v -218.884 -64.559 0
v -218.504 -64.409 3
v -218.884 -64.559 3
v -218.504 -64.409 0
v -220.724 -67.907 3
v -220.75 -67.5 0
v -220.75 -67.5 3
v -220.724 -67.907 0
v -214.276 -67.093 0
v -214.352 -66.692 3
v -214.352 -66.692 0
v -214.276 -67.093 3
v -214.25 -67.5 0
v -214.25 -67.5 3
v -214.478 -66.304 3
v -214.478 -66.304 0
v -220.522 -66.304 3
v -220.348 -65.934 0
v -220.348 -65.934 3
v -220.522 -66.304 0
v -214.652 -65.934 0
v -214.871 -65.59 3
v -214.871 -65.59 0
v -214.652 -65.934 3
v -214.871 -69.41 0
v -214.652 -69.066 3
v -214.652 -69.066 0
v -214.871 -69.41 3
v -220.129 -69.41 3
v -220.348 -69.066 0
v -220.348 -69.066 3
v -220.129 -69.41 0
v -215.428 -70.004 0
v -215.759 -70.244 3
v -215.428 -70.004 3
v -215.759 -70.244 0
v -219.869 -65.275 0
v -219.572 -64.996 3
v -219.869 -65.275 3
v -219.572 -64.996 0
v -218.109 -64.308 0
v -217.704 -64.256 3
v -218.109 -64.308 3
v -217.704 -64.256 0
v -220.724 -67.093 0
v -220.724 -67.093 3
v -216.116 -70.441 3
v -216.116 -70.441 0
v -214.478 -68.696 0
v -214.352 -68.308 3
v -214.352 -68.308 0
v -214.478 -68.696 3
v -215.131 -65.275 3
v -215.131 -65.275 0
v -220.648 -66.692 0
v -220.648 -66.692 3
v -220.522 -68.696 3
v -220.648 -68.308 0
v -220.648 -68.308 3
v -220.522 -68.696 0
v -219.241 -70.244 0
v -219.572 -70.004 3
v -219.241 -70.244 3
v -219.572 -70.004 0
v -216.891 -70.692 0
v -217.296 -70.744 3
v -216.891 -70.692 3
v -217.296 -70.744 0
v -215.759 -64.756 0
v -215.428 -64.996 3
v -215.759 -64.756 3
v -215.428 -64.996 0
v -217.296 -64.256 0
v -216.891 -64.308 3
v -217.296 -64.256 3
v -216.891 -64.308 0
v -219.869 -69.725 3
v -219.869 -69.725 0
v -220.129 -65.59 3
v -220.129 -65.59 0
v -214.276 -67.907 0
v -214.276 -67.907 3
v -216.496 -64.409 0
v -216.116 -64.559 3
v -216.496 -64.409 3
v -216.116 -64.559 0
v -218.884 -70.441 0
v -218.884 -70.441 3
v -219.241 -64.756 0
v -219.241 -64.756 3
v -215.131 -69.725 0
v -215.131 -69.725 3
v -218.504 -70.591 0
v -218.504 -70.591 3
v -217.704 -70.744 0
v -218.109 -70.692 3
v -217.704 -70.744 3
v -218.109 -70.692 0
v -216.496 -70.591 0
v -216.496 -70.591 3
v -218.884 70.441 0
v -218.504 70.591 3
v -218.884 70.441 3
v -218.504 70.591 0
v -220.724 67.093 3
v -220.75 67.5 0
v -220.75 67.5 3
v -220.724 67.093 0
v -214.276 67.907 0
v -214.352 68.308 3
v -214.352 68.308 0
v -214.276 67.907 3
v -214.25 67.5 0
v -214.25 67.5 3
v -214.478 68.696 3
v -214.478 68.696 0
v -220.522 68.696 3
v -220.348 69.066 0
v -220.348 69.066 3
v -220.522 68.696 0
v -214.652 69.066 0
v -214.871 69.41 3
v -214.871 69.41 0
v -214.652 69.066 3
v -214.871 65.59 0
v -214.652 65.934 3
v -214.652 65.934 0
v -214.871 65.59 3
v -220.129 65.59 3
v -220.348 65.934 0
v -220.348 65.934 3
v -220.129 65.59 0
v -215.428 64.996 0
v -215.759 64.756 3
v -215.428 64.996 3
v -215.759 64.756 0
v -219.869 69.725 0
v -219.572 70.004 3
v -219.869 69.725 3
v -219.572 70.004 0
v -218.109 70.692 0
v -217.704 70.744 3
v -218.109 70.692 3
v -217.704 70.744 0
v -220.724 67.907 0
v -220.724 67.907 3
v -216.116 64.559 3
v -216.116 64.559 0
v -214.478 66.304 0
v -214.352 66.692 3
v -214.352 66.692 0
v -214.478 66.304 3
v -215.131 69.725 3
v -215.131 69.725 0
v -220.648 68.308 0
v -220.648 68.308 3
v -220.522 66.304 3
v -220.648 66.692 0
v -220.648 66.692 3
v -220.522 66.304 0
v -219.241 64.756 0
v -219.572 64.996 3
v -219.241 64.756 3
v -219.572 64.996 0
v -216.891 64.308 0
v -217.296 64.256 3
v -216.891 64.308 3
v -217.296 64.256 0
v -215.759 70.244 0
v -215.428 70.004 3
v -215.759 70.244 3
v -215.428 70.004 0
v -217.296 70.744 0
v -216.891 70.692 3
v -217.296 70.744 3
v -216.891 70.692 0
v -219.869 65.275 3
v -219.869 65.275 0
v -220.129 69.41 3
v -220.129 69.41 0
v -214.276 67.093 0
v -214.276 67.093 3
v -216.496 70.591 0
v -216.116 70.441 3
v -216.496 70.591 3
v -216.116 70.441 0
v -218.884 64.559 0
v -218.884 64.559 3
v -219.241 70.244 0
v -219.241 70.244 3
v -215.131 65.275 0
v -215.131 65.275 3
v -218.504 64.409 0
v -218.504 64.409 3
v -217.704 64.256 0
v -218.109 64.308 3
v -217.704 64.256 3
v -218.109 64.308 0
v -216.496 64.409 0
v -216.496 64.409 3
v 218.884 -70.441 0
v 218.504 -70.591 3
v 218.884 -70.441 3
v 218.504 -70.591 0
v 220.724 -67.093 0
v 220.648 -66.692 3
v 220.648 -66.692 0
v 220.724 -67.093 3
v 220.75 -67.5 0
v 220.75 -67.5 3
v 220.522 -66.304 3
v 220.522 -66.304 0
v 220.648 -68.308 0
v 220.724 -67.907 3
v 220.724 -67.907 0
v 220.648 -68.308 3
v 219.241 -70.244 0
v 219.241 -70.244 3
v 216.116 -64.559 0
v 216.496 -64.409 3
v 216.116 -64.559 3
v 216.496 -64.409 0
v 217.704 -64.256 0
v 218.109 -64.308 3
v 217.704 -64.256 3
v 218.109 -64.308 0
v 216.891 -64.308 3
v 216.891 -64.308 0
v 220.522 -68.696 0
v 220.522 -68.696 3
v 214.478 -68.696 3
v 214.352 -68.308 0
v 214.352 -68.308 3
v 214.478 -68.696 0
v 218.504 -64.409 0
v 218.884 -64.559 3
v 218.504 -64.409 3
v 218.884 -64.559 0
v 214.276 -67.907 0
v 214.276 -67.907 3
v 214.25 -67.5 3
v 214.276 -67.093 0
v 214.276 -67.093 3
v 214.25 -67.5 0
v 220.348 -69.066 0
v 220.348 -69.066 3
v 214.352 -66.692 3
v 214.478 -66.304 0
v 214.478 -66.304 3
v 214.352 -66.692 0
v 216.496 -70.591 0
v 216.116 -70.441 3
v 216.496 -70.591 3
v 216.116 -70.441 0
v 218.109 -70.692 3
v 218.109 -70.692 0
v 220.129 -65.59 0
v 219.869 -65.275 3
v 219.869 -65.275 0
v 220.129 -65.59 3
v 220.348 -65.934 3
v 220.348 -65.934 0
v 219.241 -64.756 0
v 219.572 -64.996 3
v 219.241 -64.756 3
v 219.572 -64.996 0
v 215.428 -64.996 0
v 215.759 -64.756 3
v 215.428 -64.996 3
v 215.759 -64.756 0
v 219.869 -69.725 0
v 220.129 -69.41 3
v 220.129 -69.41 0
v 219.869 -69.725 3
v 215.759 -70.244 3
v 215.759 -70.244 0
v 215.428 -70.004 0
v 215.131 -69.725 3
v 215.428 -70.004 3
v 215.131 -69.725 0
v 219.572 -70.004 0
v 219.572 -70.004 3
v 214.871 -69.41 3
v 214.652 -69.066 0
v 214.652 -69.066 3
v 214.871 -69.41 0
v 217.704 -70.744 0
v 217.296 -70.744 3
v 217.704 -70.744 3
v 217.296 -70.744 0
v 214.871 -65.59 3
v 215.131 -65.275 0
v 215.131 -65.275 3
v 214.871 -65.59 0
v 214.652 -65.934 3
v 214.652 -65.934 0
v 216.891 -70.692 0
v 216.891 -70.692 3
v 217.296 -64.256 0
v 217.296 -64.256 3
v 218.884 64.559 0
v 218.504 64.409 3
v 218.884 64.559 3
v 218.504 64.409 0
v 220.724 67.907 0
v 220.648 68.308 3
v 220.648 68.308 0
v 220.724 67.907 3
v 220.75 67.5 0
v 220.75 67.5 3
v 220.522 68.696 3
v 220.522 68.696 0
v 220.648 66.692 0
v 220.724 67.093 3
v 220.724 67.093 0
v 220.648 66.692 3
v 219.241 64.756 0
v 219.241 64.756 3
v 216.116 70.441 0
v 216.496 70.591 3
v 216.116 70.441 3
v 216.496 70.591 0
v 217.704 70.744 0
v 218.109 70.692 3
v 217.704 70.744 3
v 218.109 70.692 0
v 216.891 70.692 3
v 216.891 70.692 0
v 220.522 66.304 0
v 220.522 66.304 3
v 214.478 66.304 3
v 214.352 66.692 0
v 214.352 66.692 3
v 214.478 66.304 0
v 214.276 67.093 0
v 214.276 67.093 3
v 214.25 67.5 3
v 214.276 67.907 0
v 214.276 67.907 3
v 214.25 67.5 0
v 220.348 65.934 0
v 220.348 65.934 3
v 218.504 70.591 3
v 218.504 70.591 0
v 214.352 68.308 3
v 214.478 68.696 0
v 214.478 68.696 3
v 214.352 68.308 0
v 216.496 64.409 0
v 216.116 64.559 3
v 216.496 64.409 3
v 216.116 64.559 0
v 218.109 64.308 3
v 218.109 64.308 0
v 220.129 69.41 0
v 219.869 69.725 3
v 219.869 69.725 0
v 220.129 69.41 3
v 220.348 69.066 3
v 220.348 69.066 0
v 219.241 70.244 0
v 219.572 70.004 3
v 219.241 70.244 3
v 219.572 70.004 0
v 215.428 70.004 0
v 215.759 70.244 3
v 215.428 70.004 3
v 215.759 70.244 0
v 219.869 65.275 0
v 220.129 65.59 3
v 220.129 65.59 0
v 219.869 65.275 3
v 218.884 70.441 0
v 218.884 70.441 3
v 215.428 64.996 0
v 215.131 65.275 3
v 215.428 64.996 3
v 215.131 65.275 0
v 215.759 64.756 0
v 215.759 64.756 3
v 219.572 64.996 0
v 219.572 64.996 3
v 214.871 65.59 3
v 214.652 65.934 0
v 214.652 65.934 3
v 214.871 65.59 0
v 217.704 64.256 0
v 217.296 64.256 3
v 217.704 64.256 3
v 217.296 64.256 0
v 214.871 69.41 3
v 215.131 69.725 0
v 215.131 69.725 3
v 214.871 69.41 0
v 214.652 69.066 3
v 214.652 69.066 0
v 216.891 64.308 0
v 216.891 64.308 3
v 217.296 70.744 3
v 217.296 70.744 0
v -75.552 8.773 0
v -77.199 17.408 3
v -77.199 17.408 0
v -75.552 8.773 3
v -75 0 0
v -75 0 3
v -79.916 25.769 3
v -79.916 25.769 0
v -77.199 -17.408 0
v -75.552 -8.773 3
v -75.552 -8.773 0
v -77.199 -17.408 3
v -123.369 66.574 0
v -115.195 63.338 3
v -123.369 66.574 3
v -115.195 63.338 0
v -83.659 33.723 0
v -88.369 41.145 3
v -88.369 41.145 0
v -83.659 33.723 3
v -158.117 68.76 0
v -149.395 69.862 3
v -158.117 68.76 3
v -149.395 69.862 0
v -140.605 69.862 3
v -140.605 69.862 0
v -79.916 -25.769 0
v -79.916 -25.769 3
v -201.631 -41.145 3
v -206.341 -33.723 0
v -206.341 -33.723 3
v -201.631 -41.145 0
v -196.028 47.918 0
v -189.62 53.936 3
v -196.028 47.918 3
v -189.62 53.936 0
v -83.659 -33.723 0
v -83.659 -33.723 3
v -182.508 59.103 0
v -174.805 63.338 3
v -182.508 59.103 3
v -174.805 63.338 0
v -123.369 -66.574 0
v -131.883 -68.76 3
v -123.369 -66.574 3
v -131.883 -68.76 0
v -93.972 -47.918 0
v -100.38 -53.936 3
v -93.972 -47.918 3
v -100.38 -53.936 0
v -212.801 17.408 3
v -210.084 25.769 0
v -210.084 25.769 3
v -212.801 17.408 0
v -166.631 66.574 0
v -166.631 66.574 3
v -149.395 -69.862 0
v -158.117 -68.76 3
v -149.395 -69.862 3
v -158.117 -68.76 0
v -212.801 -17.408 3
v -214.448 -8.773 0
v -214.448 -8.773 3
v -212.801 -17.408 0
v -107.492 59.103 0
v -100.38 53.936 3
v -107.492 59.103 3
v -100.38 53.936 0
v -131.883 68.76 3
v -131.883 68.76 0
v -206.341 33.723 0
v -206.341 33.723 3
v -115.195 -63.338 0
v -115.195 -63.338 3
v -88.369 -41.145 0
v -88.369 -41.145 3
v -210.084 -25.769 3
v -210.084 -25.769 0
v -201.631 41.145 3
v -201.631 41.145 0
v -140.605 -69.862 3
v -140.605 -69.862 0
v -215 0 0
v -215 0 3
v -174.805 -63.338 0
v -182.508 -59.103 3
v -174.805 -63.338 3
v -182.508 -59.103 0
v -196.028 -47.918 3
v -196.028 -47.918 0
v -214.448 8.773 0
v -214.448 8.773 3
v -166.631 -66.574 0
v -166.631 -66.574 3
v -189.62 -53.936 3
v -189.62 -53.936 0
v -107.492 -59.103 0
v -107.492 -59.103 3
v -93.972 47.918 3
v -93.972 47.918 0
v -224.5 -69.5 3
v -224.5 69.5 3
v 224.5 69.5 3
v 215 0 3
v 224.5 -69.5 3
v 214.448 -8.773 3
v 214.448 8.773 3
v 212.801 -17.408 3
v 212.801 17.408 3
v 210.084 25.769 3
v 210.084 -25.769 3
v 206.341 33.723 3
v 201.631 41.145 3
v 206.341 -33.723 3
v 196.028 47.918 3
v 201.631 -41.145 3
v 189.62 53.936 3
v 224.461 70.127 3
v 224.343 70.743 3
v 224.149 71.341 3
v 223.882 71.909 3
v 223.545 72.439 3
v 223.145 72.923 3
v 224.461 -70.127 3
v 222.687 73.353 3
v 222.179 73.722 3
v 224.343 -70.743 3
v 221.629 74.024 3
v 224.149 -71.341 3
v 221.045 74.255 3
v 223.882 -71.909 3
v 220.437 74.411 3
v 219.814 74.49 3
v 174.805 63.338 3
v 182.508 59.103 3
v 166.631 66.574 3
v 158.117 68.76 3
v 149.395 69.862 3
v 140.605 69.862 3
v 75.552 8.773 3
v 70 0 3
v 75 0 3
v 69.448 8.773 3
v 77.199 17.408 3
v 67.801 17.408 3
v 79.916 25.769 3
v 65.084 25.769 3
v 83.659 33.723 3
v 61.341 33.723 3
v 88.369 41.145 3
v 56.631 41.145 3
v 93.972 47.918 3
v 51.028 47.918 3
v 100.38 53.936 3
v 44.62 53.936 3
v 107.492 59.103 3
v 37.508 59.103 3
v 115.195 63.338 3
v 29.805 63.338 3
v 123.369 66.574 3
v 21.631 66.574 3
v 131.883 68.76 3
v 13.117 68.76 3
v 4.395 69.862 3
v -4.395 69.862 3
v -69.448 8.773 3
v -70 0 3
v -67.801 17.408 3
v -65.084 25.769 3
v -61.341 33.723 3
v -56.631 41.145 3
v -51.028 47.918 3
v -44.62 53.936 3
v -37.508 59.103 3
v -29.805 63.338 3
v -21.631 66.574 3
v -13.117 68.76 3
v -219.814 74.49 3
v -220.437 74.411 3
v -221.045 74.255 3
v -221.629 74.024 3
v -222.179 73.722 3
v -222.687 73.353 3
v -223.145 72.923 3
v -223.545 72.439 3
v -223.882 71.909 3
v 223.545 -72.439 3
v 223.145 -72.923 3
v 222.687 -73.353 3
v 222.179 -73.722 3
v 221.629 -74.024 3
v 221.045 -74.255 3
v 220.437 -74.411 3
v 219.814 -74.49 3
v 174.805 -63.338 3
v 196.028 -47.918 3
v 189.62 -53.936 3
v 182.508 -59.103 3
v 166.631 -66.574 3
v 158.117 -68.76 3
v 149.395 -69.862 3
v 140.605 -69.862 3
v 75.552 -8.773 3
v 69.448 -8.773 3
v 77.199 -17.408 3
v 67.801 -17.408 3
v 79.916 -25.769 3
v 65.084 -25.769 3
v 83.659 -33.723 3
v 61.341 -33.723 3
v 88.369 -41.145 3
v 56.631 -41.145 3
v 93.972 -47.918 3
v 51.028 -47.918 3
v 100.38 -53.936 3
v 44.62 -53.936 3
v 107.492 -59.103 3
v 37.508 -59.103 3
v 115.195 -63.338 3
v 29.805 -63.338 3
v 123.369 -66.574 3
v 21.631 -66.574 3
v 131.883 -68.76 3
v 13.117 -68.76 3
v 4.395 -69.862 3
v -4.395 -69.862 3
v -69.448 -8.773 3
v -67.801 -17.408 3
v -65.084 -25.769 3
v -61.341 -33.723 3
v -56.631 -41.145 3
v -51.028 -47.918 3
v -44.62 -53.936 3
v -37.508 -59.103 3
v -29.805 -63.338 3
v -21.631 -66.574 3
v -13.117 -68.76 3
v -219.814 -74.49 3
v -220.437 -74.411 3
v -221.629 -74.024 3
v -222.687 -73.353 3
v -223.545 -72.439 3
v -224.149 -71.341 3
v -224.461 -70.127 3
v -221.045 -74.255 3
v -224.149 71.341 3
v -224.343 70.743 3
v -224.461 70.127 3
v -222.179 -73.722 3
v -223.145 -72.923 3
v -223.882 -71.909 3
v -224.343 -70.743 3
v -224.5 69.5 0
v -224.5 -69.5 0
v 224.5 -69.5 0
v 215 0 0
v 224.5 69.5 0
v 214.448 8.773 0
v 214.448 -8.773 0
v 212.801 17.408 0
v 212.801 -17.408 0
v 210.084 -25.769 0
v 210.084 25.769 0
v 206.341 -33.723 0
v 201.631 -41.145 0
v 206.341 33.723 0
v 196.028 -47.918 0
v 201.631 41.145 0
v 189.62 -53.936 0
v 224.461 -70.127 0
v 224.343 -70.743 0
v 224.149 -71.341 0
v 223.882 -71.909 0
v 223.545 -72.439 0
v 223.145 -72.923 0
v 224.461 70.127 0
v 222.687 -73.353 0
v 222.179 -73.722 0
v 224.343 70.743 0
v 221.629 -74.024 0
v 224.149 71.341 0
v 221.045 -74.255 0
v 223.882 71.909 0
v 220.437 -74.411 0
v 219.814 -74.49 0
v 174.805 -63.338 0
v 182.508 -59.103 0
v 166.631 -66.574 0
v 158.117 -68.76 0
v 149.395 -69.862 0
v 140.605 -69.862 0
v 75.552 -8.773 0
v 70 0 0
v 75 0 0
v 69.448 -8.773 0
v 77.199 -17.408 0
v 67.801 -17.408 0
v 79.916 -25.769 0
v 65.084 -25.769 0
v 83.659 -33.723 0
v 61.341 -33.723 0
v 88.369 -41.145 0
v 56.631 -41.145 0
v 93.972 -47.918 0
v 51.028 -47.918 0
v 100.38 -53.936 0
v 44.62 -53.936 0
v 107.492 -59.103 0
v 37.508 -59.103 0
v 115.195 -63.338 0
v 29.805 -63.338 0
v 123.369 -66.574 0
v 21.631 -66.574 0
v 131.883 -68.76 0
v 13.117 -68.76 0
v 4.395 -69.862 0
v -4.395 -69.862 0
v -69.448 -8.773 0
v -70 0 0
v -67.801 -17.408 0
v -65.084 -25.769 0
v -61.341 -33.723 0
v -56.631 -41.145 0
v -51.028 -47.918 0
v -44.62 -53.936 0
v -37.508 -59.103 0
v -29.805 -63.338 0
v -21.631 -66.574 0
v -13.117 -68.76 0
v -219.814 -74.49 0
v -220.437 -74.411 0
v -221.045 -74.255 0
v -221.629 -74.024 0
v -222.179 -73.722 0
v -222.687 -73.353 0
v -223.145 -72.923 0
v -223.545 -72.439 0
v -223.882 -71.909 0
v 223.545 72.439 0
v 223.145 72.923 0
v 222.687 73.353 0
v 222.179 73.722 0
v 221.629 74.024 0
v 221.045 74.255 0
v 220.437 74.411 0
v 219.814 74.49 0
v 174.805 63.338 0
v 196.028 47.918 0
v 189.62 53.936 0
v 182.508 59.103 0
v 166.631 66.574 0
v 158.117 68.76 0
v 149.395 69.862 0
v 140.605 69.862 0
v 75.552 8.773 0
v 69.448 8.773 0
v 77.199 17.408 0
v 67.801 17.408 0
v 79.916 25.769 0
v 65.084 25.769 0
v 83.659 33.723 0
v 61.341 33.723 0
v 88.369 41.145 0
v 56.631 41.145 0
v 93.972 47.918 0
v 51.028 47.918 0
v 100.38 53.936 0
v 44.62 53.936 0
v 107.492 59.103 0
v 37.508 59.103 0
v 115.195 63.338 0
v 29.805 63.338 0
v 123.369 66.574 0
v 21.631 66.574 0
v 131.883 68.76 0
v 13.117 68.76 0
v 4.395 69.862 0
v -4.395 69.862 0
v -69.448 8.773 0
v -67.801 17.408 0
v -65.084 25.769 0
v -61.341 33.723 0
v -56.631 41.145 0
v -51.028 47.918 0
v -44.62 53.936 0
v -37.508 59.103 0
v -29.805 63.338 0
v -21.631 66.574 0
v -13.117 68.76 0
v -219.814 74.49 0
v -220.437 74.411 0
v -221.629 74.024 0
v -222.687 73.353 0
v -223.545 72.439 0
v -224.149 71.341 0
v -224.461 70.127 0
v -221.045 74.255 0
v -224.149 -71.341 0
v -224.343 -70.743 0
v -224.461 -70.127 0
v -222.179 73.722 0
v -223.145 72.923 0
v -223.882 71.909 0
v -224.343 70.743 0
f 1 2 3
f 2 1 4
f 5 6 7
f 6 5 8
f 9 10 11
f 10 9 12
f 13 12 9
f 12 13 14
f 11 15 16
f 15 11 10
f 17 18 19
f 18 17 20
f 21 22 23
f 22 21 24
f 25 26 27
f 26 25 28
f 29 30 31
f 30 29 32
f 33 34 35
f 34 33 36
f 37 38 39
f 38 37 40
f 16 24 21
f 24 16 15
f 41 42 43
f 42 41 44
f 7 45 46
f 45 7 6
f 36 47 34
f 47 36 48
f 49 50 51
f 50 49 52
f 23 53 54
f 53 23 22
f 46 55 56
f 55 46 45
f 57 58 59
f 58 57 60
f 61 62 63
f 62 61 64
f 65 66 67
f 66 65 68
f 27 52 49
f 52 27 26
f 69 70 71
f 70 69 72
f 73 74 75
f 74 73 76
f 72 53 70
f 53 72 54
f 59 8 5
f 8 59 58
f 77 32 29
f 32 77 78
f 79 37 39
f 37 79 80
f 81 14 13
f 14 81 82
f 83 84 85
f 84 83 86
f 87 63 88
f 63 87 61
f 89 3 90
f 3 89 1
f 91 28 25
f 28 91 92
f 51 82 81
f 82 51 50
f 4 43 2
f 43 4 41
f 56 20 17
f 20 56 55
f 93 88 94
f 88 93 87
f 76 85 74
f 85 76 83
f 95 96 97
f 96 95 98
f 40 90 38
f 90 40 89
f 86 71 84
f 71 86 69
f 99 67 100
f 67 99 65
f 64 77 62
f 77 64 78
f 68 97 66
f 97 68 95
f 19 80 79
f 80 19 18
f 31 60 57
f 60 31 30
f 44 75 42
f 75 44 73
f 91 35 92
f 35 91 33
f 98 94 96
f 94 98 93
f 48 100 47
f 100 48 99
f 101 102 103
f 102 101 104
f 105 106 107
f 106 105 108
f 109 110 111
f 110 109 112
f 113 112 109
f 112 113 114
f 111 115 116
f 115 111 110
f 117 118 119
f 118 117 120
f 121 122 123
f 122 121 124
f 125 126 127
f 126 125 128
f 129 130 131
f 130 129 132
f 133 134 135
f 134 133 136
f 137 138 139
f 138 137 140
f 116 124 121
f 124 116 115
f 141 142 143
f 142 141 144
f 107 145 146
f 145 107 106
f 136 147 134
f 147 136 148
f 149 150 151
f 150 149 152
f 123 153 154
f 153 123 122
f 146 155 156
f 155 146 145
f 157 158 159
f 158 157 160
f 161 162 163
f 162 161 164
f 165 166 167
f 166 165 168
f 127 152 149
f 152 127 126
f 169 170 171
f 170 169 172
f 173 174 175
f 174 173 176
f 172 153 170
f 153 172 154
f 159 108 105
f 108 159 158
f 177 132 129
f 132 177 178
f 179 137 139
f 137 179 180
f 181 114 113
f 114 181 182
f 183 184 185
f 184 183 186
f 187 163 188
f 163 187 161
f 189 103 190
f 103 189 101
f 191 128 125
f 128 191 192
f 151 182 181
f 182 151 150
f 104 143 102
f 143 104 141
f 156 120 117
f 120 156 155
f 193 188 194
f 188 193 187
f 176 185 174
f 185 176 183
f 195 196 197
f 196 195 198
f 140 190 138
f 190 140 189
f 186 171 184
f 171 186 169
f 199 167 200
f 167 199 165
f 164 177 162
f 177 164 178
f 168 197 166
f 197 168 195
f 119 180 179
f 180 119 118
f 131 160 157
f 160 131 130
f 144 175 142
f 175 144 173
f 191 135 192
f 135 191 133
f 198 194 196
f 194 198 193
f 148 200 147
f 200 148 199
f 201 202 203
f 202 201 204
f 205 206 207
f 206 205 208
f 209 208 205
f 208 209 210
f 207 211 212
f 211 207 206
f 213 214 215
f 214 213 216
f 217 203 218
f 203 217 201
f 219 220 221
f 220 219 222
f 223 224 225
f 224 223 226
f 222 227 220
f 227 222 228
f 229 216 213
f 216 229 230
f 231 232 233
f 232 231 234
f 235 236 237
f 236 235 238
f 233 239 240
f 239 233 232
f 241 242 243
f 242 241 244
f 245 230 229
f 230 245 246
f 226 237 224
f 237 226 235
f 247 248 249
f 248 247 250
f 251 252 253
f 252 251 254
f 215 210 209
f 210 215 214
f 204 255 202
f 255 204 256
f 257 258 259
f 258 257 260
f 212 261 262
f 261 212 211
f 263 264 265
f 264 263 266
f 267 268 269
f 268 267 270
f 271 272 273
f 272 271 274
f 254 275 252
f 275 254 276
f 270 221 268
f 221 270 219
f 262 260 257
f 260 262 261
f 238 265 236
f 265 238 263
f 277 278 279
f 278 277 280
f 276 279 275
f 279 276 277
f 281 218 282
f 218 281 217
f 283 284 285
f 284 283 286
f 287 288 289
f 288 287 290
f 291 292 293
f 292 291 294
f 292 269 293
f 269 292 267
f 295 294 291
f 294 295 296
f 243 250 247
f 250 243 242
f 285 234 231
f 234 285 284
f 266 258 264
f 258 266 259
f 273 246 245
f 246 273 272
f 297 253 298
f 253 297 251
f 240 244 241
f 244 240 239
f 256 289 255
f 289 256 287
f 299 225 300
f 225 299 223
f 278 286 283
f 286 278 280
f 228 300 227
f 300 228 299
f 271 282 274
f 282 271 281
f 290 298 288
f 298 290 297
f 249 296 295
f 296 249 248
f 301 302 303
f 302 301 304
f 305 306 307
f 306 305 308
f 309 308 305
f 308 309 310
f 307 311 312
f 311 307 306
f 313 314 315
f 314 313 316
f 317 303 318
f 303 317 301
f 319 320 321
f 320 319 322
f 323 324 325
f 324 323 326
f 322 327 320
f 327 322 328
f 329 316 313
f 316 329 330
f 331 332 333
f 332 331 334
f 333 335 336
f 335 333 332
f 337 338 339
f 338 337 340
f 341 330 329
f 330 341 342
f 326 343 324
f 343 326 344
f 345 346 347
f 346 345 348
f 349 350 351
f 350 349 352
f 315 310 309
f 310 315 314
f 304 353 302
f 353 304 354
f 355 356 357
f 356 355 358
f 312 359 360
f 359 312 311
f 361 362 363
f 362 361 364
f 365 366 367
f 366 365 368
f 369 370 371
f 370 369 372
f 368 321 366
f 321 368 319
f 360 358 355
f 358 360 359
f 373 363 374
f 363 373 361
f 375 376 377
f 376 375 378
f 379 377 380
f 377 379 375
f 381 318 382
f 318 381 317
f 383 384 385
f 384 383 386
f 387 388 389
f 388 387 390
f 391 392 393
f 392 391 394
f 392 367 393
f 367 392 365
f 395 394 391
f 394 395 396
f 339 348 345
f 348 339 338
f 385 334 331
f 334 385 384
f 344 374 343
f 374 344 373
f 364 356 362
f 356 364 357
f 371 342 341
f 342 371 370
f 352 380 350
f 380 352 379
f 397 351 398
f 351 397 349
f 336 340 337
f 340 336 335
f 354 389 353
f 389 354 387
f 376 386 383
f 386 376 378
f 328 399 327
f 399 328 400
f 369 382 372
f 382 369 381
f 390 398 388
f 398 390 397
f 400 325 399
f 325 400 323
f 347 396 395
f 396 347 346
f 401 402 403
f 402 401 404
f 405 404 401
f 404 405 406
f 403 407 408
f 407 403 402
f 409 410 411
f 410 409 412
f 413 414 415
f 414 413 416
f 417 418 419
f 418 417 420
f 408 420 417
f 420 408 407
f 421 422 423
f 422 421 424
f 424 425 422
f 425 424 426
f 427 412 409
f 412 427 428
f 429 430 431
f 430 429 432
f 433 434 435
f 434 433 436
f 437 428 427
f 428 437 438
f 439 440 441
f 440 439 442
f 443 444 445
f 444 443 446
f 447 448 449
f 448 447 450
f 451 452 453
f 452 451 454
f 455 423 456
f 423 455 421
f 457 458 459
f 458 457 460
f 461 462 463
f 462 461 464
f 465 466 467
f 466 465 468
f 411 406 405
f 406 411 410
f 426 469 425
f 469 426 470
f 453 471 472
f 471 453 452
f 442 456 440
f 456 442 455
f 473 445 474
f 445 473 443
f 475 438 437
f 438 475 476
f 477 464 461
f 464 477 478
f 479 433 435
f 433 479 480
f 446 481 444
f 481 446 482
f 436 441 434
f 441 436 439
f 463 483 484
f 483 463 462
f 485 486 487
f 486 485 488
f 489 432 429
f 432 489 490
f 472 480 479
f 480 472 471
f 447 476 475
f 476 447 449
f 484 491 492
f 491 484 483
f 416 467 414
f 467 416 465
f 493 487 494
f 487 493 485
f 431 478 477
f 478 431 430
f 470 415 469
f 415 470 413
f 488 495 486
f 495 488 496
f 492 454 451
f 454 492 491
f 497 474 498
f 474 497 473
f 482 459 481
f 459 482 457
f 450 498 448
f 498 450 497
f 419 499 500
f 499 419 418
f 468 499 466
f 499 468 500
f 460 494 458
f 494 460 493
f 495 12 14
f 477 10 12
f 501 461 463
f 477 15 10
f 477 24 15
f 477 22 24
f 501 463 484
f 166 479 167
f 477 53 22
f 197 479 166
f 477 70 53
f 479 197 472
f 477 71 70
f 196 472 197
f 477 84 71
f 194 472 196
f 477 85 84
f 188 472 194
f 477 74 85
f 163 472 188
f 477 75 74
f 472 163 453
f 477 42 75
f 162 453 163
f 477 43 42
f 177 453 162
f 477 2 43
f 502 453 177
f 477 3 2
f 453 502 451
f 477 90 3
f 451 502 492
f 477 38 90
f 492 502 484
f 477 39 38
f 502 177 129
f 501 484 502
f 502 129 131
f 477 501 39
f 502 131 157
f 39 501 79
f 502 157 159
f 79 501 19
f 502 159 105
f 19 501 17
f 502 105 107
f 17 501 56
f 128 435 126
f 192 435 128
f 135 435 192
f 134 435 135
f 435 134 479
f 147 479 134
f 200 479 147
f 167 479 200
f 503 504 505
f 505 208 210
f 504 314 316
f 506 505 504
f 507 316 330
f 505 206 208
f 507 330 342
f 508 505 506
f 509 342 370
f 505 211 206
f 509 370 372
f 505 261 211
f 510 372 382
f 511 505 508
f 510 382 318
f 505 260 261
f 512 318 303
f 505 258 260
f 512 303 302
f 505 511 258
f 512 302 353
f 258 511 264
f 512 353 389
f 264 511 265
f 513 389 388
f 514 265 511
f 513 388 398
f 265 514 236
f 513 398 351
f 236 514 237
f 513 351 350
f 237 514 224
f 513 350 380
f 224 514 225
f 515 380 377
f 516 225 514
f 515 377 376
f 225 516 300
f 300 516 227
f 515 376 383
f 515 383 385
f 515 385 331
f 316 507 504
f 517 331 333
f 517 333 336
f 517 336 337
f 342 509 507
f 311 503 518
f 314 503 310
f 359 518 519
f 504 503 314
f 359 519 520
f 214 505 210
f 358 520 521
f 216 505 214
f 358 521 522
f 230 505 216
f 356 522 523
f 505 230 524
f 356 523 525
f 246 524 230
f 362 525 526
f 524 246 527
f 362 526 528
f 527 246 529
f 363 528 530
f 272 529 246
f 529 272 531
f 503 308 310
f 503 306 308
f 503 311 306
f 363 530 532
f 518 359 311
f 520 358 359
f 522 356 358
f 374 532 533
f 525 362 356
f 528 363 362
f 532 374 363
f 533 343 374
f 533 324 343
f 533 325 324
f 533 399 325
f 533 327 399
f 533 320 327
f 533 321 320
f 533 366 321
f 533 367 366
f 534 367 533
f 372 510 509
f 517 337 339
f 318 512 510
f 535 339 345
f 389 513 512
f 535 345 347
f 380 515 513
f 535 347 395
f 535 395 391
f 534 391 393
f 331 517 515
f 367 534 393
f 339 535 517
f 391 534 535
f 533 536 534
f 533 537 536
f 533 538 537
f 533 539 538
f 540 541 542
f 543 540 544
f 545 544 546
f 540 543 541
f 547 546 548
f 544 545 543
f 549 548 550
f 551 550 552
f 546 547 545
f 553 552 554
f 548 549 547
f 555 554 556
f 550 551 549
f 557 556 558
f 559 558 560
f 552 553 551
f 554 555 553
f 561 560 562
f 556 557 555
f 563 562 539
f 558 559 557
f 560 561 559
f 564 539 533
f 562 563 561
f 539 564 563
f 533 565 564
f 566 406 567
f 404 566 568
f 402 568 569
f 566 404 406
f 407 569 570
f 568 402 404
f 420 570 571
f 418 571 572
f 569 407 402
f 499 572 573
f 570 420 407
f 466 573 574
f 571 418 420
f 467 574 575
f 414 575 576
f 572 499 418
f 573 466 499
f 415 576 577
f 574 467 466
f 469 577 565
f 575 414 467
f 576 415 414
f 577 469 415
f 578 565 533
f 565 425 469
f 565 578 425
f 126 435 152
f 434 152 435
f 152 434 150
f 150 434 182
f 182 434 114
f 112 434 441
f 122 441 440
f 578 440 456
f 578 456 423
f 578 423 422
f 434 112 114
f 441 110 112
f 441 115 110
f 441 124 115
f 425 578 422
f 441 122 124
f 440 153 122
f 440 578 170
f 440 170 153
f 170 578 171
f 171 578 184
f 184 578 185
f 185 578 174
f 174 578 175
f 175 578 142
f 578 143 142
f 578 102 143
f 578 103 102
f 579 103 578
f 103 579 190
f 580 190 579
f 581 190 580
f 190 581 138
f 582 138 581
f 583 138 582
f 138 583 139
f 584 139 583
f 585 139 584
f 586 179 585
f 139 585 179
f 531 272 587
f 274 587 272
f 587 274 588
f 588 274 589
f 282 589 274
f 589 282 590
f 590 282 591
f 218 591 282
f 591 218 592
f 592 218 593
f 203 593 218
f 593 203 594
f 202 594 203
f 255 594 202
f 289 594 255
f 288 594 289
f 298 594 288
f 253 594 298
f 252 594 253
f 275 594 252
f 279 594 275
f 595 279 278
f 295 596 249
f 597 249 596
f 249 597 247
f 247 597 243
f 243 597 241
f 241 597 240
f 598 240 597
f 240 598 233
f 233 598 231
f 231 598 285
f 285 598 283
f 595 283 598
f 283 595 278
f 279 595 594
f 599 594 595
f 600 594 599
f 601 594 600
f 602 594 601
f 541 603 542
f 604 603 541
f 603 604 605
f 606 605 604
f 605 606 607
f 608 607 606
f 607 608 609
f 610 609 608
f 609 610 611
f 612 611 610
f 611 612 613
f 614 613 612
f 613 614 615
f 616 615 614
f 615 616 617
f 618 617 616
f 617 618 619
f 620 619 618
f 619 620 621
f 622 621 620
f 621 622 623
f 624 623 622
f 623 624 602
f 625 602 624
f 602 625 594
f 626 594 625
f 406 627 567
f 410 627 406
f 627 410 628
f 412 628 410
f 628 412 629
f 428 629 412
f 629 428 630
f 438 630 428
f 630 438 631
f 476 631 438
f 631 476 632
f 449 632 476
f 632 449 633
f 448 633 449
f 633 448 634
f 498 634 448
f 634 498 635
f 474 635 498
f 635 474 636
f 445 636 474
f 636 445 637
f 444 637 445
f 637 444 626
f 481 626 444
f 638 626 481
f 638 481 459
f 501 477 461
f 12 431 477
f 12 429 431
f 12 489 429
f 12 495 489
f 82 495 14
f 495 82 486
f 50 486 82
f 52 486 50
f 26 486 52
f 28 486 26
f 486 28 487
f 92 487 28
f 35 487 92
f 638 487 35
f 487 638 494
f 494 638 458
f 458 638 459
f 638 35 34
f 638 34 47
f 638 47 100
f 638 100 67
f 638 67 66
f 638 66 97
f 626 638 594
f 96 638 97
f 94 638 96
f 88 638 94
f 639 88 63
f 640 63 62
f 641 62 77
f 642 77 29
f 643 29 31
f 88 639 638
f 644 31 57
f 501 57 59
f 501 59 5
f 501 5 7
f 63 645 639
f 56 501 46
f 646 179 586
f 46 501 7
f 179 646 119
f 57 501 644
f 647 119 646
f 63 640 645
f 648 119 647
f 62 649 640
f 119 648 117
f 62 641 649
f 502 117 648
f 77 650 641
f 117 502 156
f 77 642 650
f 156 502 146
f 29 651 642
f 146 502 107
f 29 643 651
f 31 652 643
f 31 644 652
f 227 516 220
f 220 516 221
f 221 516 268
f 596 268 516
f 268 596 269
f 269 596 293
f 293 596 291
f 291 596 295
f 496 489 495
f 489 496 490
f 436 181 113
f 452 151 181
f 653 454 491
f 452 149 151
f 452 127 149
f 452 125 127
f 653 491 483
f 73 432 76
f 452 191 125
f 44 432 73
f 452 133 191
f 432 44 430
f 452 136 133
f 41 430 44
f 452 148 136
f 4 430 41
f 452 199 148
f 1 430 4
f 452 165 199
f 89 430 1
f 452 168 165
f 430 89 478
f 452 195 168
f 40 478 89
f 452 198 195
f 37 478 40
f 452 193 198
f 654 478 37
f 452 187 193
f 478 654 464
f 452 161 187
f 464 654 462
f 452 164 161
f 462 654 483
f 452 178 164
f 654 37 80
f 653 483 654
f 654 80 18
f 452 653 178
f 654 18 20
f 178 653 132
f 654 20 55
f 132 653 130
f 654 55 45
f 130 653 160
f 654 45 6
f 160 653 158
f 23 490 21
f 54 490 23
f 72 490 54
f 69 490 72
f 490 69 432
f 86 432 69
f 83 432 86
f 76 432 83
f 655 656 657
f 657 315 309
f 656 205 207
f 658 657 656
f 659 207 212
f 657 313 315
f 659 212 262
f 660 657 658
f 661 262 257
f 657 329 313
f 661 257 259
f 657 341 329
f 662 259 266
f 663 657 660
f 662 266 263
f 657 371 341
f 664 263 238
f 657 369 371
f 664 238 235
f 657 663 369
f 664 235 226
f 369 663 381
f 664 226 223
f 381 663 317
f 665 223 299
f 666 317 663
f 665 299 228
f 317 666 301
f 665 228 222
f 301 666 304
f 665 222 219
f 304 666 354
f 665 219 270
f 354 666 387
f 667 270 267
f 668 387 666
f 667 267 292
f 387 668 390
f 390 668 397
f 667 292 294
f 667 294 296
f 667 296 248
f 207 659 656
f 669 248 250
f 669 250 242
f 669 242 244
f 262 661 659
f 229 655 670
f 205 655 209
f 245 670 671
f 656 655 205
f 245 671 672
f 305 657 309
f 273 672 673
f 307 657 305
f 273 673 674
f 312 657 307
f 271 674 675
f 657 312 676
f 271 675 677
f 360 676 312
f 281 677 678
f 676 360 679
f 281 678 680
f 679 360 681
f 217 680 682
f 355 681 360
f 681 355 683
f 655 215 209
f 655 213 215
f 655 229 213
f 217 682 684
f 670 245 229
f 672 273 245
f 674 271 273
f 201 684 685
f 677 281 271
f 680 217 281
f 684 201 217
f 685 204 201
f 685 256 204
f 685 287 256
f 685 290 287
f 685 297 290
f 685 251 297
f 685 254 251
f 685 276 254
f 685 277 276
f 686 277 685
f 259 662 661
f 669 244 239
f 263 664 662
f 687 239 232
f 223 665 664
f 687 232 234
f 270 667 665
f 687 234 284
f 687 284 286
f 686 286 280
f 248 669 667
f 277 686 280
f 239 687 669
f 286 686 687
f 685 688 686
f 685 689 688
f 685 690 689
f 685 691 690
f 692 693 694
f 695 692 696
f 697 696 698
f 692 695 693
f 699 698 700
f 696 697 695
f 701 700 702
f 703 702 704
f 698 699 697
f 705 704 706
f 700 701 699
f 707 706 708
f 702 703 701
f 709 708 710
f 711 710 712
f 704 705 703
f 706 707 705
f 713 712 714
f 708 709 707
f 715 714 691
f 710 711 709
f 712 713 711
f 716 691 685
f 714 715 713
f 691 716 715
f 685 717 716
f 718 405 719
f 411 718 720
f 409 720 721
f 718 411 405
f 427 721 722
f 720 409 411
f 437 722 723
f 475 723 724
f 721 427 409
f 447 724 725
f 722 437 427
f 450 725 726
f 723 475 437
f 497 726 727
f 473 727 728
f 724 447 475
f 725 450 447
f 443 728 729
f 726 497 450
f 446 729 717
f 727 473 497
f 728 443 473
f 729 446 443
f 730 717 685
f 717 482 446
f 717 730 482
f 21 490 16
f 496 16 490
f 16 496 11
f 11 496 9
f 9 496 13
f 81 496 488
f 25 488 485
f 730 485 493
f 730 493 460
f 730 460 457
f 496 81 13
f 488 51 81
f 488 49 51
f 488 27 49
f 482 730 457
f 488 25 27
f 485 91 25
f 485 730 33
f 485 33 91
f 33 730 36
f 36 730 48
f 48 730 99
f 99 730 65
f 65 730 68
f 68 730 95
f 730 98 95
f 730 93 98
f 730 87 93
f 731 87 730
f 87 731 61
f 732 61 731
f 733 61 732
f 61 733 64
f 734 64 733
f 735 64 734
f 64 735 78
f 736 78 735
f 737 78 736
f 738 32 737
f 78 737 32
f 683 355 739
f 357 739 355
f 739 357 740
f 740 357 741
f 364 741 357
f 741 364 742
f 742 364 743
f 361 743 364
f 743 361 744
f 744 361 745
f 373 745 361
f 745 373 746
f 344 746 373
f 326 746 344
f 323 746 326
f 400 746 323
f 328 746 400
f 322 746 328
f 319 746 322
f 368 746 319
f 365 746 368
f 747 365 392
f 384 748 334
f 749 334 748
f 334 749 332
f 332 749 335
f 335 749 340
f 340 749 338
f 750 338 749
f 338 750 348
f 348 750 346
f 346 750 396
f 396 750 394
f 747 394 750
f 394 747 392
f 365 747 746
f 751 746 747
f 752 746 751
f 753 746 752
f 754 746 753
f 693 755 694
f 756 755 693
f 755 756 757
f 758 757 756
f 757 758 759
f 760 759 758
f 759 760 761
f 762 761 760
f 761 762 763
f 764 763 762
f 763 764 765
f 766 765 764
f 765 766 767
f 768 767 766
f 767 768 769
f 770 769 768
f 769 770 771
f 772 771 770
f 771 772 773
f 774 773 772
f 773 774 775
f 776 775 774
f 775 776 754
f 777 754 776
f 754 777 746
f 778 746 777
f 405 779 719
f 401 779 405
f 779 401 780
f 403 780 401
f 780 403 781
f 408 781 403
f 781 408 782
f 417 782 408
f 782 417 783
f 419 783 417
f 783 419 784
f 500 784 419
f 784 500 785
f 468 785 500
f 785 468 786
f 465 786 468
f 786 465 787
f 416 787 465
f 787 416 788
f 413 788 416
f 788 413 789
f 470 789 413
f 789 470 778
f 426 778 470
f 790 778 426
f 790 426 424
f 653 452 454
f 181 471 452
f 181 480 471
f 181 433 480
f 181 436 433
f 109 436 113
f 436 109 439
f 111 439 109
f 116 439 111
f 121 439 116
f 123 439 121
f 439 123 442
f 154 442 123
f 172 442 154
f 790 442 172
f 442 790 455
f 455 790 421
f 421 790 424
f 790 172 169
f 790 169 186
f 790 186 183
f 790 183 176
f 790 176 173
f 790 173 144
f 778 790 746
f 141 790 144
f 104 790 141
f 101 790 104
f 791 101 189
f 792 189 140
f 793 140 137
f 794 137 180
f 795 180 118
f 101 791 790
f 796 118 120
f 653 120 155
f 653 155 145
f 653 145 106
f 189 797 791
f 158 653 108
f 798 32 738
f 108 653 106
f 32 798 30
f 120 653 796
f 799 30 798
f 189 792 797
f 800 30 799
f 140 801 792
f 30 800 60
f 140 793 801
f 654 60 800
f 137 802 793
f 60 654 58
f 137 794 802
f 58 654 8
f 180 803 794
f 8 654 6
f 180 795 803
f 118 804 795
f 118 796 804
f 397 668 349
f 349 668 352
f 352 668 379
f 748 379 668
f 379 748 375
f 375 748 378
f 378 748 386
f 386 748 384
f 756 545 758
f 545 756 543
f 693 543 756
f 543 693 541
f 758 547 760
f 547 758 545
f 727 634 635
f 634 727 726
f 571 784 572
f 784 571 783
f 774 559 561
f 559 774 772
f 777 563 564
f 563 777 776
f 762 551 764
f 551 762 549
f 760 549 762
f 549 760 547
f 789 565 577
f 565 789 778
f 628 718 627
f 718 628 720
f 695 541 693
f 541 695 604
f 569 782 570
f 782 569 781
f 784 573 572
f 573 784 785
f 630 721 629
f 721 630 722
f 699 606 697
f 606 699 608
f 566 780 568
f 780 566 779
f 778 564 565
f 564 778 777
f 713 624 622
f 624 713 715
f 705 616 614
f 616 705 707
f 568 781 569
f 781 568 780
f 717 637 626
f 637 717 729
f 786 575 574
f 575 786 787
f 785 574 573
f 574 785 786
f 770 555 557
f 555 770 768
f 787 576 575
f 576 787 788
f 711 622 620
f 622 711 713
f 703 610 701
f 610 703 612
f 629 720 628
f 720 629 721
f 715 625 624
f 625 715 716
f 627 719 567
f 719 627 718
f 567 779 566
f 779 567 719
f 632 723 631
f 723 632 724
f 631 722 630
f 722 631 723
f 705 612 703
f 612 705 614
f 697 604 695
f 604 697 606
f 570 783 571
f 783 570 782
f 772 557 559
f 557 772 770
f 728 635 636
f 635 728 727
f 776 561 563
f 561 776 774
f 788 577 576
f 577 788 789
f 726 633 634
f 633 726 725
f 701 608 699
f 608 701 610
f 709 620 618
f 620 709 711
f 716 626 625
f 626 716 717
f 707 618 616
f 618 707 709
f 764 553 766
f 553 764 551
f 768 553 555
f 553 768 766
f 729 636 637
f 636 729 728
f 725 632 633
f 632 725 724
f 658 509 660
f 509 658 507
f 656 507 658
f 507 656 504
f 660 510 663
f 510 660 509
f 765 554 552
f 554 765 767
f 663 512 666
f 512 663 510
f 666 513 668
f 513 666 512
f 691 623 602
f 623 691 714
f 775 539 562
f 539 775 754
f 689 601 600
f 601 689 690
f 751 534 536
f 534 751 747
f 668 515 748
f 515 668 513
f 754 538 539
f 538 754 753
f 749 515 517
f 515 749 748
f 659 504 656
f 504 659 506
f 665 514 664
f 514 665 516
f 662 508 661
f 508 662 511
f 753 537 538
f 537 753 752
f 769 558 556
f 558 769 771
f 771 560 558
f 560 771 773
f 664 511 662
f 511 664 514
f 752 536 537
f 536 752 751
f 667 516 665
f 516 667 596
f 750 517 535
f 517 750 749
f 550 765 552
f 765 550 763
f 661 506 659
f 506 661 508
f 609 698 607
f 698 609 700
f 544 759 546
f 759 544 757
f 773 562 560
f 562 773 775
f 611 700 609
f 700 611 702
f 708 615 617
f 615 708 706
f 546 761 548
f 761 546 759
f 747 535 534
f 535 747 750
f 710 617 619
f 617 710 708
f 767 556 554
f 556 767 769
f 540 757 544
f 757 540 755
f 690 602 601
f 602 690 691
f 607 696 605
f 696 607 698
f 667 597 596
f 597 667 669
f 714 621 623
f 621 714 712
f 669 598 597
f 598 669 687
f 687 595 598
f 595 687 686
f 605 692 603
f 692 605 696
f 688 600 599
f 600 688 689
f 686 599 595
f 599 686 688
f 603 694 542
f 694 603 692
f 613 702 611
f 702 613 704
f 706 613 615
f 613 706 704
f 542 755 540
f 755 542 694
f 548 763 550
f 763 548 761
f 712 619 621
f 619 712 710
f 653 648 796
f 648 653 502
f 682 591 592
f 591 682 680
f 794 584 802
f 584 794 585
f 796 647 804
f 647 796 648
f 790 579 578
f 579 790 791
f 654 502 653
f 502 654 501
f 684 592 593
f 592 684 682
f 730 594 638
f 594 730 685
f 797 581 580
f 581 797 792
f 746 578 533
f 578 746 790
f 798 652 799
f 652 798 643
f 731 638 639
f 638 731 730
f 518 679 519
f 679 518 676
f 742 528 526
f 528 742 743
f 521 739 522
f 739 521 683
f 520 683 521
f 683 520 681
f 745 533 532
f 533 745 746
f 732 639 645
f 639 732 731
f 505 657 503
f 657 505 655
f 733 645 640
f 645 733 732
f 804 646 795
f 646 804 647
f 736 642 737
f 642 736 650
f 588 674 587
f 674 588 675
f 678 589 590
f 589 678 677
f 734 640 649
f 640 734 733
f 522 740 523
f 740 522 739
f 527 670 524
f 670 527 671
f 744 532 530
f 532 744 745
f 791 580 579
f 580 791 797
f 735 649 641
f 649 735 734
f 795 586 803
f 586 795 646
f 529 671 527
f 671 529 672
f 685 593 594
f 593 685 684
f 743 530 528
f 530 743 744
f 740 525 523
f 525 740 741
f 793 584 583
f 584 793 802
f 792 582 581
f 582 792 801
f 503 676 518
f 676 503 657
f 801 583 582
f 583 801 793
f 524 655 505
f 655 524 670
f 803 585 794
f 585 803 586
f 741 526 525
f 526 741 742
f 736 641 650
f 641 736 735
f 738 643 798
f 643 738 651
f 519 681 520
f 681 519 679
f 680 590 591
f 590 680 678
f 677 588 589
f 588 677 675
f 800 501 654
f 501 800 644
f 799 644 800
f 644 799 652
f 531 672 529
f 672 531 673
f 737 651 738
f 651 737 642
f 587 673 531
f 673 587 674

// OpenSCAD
$fn = 50;

difference() {
	union() {
		hull() {
			translate(v = [-219.5, 69.5, 0]) {
				cylinder(h = 3, r = 5);
			}
			translate(v = [219.5, 69.5, 0]) {
				cylinder(h = 3, r = 5);
			}
			translate(v = [-219.5, -69.5, 0]) {
				cylinder(h = 3, r = 5);
			}
			translate(v = [219.5, -69.5, 0]) {
				cylinder(h = 3, r = 5);
			}
		}
	}
	union() {
		translate(v = [-217.5, -67.5, -100.0]) {
			cylinder(h = 200, r = 3.25);
		}
		translate(v = [-217.5, 67.5, -100.0]) {
			cylinder(h = 200, r = 3.25);
		}
		translate(v = [217.5, -67.5, -100.0]) {
			cylinder(h = 200, r = 3.25);
		}
		translate(v = [217.5, 67.5, -100.0]) {
			cylinder(h = 200, r = 3.25);
		}
		translate(v = [-217.5, -67.5, -100.0]) {
			cylinder(h = 200, r = 1.8);
		}
		translate(v = [-217.5, 67.5, -100.0]) {
			cylinder(h = 200, r = 1.8);
		}
		translate(v = [217.5, -67.5, -100.0]) {
			cylinder(h = 200, r = 1.8);
		}
		translate(v = [217.5, 67.5, -100.0]) {
			cylinder(h = 200, r = 1.8);
		}
		translate(v = [-145.0, 0, 0.0]) {
			cylinder(h = 3, r = 70.0);
		}
		cylinder(h = 3, r = 70.0);
		translate(v = [145.0, 0, 0.0]) {
			cylinder(h = 3, r = 70.0);
		}
	}
}
